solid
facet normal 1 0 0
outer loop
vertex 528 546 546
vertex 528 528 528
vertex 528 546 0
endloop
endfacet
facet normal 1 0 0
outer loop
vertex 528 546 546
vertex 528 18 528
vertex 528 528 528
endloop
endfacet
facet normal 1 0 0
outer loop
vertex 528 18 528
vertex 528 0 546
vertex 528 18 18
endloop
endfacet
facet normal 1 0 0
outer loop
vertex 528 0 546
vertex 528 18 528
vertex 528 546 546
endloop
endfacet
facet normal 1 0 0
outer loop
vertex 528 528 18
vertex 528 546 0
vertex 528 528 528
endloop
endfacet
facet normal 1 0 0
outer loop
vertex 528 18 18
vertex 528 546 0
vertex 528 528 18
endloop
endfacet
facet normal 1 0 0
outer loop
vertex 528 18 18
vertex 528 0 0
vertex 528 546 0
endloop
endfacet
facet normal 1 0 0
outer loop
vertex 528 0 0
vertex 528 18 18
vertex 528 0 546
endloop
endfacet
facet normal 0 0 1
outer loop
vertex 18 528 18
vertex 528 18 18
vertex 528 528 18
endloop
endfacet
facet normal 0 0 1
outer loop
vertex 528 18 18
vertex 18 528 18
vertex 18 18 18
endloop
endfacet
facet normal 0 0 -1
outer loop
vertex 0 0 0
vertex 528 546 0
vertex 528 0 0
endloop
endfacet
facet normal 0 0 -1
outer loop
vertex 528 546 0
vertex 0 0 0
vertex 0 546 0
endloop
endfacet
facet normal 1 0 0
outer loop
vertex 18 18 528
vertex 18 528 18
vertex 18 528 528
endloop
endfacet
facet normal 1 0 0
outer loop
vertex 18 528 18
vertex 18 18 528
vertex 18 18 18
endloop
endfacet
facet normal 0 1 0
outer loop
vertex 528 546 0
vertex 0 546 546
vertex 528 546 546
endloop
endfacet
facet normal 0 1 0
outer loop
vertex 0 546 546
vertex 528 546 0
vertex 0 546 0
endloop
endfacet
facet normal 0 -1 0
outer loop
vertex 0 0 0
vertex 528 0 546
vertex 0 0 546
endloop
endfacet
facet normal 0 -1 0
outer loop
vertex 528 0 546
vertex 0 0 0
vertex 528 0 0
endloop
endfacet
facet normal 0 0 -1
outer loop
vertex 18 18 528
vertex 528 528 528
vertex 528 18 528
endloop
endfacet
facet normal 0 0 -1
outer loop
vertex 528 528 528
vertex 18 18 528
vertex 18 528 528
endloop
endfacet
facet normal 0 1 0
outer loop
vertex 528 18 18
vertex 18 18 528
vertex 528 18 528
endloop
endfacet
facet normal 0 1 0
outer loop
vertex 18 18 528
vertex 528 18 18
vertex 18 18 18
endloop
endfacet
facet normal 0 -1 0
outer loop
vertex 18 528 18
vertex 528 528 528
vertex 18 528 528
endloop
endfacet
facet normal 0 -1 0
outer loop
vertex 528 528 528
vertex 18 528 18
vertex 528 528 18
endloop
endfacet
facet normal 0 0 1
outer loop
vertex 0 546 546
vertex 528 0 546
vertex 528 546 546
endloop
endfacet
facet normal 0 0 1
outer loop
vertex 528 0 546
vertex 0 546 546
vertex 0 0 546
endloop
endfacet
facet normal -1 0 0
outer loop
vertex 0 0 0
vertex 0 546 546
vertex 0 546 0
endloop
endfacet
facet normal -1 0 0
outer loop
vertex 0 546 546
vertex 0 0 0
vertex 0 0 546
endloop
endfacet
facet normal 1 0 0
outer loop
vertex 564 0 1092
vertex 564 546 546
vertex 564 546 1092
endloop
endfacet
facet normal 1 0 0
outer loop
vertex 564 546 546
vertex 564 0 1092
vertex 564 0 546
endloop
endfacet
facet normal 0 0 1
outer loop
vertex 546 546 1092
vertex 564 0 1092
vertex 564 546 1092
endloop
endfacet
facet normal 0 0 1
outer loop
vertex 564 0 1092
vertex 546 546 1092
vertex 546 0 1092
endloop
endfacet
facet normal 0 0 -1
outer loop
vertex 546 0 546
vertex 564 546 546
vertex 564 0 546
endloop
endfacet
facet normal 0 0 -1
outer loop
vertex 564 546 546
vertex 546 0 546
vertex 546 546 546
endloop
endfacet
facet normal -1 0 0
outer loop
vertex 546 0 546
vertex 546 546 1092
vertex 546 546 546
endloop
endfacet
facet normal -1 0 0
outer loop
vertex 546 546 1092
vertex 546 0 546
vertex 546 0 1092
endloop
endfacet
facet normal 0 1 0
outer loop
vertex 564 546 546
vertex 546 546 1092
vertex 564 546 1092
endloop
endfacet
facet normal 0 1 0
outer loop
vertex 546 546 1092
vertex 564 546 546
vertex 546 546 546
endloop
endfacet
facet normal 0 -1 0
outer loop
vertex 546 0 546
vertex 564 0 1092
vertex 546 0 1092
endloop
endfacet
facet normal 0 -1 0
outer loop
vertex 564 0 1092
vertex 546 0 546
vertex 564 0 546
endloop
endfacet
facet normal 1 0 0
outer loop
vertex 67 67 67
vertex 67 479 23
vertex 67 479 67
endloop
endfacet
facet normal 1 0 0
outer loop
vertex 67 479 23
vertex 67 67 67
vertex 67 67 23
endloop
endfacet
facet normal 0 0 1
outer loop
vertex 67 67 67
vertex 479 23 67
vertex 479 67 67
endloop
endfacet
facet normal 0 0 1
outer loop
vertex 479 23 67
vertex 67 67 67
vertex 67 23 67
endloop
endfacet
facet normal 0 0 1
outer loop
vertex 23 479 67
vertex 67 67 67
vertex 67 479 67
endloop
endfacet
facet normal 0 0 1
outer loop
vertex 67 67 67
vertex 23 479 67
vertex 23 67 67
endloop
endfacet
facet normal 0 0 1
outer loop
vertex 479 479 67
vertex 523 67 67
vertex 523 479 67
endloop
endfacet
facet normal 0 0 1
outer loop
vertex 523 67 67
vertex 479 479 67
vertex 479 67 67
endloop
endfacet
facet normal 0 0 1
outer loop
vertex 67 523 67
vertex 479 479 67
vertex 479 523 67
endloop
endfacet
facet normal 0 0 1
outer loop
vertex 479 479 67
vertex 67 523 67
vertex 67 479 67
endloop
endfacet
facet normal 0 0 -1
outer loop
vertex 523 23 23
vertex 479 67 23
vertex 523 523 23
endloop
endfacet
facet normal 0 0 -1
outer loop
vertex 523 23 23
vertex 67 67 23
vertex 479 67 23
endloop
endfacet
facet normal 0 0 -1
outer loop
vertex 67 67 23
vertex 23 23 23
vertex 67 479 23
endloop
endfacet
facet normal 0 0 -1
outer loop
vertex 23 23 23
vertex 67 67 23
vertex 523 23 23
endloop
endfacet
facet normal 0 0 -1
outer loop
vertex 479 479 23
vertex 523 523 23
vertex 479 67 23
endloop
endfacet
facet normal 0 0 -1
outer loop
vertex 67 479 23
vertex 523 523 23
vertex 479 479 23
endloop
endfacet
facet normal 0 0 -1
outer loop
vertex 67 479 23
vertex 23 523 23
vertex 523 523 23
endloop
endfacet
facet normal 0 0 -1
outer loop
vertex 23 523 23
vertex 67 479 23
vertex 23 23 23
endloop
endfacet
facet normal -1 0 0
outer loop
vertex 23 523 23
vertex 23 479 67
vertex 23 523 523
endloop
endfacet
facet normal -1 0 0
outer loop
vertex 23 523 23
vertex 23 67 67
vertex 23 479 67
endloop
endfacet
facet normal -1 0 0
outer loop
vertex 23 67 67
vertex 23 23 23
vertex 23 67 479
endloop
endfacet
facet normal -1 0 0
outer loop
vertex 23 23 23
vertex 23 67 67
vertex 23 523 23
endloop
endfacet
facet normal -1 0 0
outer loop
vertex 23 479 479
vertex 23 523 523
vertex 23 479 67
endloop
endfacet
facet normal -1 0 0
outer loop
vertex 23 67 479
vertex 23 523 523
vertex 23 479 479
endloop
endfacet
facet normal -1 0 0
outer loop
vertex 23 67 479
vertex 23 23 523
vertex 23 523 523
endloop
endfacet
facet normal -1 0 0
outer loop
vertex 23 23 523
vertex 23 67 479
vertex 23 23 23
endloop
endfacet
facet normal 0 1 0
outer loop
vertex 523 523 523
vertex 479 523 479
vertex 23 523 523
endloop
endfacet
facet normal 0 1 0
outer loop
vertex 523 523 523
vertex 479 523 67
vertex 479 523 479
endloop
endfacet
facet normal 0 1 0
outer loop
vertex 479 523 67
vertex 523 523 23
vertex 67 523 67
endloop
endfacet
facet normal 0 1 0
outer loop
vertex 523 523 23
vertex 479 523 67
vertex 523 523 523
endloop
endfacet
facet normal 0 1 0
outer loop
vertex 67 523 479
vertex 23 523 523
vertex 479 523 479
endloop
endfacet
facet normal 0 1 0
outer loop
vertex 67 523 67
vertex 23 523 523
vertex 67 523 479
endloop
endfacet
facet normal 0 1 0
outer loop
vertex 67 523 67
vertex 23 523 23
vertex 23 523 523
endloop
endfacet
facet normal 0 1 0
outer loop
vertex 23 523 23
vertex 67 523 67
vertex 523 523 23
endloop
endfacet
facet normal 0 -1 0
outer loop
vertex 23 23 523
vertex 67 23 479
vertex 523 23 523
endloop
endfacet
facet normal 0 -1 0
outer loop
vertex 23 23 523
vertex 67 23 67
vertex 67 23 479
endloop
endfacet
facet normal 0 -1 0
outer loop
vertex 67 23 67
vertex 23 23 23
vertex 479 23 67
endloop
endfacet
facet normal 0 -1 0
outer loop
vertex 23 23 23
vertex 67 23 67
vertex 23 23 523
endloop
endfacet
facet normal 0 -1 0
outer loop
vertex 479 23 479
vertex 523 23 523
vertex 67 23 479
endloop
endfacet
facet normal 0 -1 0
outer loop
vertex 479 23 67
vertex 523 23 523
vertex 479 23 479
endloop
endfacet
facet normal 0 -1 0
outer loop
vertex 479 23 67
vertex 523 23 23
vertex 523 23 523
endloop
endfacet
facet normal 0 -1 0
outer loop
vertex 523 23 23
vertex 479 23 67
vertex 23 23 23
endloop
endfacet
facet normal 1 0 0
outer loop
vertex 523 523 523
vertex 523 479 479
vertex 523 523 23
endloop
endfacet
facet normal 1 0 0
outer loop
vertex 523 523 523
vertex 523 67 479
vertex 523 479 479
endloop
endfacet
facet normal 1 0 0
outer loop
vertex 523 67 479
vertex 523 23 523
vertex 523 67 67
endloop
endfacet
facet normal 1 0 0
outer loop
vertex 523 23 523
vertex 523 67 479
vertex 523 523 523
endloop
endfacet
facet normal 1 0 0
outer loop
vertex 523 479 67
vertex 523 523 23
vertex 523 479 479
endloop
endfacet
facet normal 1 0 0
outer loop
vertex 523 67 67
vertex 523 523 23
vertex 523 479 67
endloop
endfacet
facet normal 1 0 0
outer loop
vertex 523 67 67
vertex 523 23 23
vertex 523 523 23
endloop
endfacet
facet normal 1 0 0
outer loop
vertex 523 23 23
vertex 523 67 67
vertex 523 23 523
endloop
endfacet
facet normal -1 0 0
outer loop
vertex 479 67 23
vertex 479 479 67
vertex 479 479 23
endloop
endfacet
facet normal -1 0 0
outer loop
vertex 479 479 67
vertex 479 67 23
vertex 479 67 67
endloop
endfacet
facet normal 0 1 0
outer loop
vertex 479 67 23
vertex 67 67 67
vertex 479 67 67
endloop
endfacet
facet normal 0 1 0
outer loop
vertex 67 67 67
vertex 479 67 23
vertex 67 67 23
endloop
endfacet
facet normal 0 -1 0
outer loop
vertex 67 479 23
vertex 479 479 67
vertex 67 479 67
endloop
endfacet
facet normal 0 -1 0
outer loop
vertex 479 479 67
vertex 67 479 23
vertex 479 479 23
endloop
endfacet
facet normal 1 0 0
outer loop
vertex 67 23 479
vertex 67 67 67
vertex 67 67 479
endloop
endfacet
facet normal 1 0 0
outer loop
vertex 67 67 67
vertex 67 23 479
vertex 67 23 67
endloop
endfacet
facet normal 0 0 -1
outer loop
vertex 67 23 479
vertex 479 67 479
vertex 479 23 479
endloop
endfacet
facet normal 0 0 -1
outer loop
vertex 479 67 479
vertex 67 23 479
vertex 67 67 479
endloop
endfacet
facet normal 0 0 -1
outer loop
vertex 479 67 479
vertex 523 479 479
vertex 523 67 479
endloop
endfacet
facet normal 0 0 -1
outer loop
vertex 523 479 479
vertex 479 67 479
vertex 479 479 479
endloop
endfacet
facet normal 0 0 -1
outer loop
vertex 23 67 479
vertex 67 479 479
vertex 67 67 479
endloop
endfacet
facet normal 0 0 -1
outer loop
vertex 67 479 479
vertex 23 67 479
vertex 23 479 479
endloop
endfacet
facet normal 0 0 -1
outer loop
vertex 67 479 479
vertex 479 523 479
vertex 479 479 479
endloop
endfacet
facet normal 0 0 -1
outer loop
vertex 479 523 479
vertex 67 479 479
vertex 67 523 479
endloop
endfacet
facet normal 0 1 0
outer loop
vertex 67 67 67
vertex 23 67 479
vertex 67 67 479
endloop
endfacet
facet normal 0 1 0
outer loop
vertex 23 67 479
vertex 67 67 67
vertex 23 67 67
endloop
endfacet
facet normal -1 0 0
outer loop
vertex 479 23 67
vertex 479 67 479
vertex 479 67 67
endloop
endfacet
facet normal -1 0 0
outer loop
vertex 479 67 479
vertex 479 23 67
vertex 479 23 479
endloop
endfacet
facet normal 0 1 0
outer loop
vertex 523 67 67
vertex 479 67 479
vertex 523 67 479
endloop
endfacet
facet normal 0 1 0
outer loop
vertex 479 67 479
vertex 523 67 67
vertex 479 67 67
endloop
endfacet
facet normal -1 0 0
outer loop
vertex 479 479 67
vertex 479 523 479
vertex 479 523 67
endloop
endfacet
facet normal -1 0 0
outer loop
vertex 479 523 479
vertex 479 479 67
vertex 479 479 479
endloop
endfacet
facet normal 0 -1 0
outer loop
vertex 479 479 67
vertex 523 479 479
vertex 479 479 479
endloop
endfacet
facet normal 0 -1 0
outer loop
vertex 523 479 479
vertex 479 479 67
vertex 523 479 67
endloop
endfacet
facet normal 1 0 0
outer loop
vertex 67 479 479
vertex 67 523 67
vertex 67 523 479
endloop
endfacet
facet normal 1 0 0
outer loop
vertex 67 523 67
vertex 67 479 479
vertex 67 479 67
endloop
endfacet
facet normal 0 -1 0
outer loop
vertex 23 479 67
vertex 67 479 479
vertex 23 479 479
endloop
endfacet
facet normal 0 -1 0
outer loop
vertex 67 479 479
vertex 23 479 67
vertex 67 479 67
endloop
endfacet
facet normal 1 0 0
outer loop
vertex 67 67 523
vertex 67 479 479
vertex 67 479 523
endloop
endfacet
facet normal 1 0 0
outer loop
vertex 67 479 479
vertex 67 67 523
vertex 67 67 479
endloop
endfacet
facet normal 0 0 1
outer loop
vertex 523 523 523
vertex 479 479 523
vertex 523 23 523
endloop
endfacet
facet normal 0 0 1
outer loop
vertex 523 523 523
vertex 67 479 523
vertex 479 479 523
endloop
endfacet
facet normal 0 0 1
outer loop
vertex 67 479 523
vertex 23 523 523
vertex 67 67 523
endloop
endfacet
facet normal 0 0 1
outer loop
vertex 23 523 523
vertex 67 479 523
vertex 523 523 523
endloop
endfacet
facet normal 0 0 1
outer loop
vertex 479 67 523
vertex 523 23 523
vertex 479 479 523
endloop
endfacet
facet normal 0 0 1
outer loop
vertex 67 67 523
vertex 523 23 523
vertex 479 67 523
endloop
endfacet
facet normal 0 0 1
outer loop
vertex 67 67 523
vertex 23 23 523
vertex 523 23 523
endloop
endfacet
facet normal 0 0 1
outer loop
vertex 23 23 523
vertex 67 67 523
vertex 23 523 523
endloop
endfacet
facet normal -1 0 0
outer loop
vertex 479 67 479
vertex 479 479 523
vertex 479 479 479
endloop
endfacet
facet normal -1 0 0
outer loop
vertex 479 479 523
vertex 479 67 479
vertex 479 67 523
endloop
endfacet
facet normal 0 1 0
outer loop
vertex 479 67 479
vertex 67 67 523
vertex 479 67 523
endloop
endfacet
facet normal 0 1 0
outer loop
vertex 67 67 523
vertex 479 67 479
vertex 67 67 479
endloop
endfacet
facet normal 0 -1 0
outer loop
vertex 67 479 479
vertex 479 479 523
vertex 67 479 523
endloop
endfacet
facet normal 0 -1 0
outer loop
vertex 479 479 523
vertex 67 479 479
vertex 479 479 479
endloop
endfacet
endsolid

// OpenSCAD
// multiplex plaat; 18 mm

multiplex = 18;

module multiplex_plaat(dims, name="") {
    assert(len([ for (x = dims) if (x == multiplex) x ]) == 1);
    otherdims = [ for (x = dims) if (x != multiplex) x ];
    echo(str("BOM: 18 mm multiplex plaat ", otherdims[0], " * ", otherdims[1], " ", name));
    cube(dims);
}

// color([0.5, 0.5, 0.3])
module outer(depth, width_, height_) {
    width = width_+2*multiplex;
    height = height_+2*multiplex;
    // now, outer dimensions are 500, but inner dimensions should be 500
     {
        translate([multiplex, 0, 0]) multiplex_plaat([depth, width, multiplex], name="bottom");
        translate([multiplex,0,multiplex]) multiplex_plaat([depth, multiplex, height-2*multiplex], name="left");
        translate([multiplex,width-multiplex,multiplex]) multiplex_plaat([depth, multiplex, height-2*multiplex], name="right");
        #translate([multiplex,0,height-multiplex]) multiplex_plaat([depth, width, multiplex], name="top");

        translate([0,0,0]) multiplex_plaat([multiplex, width, height], name="back");
        translate([depth+2*multiplex, 0, height]) multiplex_plaat([multiplex, width, height], name="front");
    }
}

module vurenhout_balk(dims) {
    // https://www.hubo.be/nl/p/vurenhout-geschaafd-44x44-mm-210cm/20865/
    assert(len([ for (x = dims) if (x == 44) x ]) == 2);
    t = [ for (x = dims) if (x != 44) x ][0];
    echo(str("BOM: vurenhout_balk 44x44, l=", t));
    cube(dims);
}

module bottom(depth, width, height, explode=0) {
    vurenhout_balk([44, width, 44]);
    translate([depth-44 + 2*explode, 0, 0]) vurenhout_balk([44, width, 44]);
    translate([44+explode, 0, 0]) vurenhout_balk([depth-2*44, 44, 44]);
    translate([44+explode, width-44, 0]) vurenhout_balk([depth-2*44, 44, 44]);
}

module cage(depth, width, height, explode=0) {
    bottom(depth, width, height, explode);
    translate([0, 0, 44+explode]) {
        vurenhout_balk([44, 44, height-2*44]);
        translate([depth-44+2*explode, 0, 0]) vurenhout_balk([44, 44, height-2*44]);
        translate([depth-44+2*explode, width-44, 0]) vurenhout_balk([44, 44, height-2*44]);
        translate([0, width-44, 0]) vurenhout_balk([44, 44, height-2*44]);
    }
    translate([0, 0, height-44+2*explode]) bottom(depth, width, height, explode);
}

// margin for errors
p=5;
outer(500+2*p, 500+2*p, 500+2*p);
translate([multiplex+p, multiplex+p, multiplex+p]) cage(500, 500, 500, explode=0);
